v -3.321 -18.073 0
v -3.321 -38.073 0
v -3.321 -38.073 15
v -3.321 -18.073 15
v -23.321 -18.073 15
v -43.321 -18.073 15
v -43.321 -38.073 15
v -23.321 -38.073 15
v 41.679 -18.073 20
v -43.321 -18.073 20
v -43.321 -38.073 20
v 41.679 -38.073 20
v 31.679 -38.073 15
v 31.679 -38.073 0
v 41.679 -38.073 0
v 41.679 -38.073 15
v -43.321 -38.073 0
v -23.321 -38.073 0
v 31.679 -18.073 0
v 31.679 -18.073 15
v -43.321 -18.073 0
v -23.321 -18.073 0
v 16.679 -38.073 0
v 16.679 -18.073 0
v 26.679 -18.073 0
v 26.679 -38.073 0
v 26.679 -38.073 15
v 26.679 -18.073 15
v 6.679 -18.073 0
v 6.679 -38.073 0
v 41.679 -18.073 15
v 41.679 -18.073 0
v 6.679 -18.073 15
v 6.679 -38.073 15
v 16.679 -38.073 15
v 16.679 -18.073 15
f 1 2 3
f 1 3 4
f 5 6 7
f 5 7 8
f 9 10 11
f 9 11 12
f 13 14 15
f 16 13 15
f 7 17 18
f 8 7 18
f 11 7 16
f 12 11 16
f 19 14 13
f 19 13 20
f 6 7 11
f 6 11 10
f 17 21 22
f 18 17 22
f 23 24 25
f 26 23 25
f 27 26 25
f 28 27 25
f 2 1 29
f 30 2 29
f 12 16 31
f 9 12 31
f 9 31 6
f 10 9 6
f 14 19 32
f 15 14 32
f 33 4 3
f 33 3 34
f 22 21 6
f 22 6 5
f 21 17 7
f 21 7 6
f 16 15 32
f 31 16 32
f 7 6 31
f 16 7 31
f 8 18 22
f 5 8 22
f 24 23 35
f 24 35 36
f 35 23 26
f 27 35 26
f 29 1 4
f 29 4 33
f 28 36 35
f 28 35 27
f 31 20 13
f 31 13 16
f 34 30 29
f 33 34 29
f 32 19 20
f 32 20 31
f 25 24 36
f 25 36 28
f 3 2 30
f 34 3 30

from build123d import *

# Parameters (mm, degrees)
F0_W     = 20
F0_H     = 20
F0_W_2   = 10
F1_DEPTH = 15
F2_W     = 65
F2_H     = 20
F2_W_2   = 20
F3_DEPTH = 5


with BuildPart() as f1:
    # F0 (on Top) → F1 (new body)
    with BuildSketch(Plane.XY):
        with Locations((-33.321282, -28.07335)):
            Rectangle(F0_W, F0_H)
        with Locations((1.678718, -28.07335)):
            Rectangle(F0_W_2, F0_H)
        with Locations((21.678718, -28.07335)):
            Rectangle(F0_W_2, F0_H)
        with Locations((36.678718, -28.07335)):
            Rectangle(F0_W_2, F0_H)
    extrude(amount=F1_DEPTH)


with BuildPart() as f3:
    # F2 (on face) → F3 (new body)
    with BuildSketch(Plane.XY.offset(15)):
        with Locations((9.178718, -28.07335)):
            Rectangle(F2_W, F2_H)
        with Locations((-33.321282, -28.07335)):
            Rectangle(F2_W_2, F2_H)
    extrude(amount=F3_DEPTH)


solid = Compound([f1.part, f3.part])
